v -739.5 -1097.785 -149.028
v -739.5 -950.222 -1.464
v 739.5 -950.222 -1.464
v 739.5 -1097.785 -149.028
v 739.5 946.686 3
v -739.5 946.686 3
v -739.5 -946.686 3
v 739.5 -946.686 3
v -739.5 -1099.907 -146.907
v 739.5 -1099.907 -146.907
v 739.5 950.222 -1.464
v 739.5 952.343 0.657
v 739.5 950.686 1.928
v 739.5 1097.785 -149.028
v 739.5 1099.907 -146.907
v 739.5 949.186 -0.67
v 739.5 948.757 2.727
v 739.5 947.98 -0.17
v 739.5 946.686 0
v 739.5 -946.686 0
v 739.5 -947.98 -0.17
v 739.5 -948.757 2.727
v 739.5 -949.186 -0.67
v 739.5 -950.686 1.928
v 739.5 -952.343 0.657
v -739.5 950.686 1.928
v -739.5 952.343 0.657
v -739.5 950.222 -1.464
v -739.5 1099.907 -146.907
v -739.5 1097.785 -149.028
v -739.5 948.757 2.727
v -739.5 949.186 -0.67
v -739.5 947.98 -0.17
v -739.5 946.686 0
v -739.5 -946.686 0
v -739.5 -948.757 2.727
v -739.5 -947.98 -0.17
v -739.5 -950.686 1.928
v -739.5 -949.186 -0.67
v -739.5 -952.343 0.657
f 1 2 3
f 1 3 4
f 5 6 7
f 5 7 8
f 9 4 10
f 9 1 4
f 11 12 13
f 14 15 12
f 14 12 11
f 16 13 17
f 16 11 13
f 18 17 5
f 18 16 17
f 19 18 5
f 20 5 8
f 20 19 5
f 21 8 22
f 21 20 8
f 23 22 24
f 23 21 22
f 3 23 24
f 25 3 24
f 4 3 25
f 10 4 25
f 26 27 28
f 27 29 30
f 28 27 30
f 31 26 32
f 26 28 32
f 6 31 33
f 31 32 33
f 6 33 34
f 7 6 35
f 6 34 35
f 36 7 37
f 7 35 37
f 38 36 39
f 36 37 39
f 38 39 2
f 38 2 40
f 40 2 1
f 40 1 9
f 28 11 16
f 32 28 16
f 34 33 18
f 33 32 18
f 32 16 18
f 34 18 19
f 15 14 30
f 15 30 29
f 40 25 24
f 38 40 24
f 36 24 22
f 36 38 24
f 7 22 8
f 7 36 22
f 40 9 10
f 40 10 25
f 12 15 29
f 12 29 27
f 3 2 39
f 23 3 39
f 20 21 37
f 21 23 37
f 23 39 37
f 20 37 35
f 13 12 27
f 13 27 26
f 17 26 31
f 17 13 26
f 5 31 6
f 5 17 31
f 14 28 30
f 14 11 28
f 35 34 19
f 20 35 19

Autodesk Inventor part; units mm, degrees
ref_plane "YZ Plane" through (0, 0, 0) normal (1, 0, 0) x (0, 1, 0)
ref_plane "XZ Plane" through (0, 0, 0) normal (0, 1, 0) x (-1, 0, 0)
ref_plane "XY Plane" through (0, 0, 0) normal (0, 0, 1) x (1, 0, 0)
sketch "Sketch1" plane through (0, 0, 0) normal (0, 0, 1) x (1, 0, 0)
  line L0 (-739.5, -950) -> (739.5, -950)
  line L1 (739.5, -950) -> (739.5, 950)
  line L2 (739.5, 950) -> (-739.5, 950)
  line L3 (-739.5, 950) -> (-739.5, -950)
  line L4 (-739.5, -950) -> (739.5, 950) construction
  line L5 (739.5, -950) -> (-739.5, 950) construction
  point P0 (0, 0)
  dimension "d0" = 1479
  dimension "d1" = 1900
extrude "Plate1" add sketch "Sketch1" along normal blind 3
sketch "Sketch2" plane through (739.5, 947.8787, 0.8787) normal (0, 0.7071068, 0.7071068) x (-1, 0, 0)
  line L0 (1479, 0) -> (0, 0)
  line L1 (0, 0) -> (0, -212)
  line L2 (0, -212) -> (1479, -212)
  line L3 (1479, -212) -> (1479, 0)
edge flange "Flange1" height 212 angle 45 thickness 3 bend radius 5 thickness toward (0, 0.7071068, 0.7071068) relief round relief width 3 relief depth 1.5 corner gap 5 corner form 0 edges at (0, 950, 0) (0, -950, 0) wall of the first edge with corners at (-739.5, 947.8787, 0.8787) (739.5, 947.8787, 0.8787) (739.5, 1097.7853, -149.028) (-739.5, 1097.7853, -149.028)
bend "Bend1"
corner "Corner1"
sketch "Sketch4" plane through (739.5, 1097.7853, -149.028) normal (0, -0.7071068, -0.7071068) x (-1, 0, 0)
  line L0 (25, -40) -> (25, -25) construction
  line L1 (25, -25) -> (225, -25) construction
  line L2 (225, -25) -> (225, -40) construction
  line L3 (225, -40) -> (25, -40) construction
  line L4 (1479, 0) -> (0, 0) projected
  line L5 (0, -208.6863) -> (0, 0) projected
  point P0 (739.5, -881.6301)
  dimension "d13" = 200
  dimension "d14" = 15
  dimension "d15" = 25
  dimension "d16" = 25
mark "Mark1"
equation "\"d2\" = Thickness"
equation "\"d3\" = BendReliefWidth"
equation "\"d4\" = BendReliefDepth"
equation "\"d5\" = MinimumRemnant"
equation "\"d6\" = TransitionRadius"
equation "\"d9\" = BendRadius"
equation "\"d10\" = CornerReliefSize"
equation "\"d11\" = GapSize"
equation "\"d12\" = JacobiRadiusSize"
equation "\"BendReliefWidth\" = Thickness"
equation "\"BendReliefDepth\" = 0.5 * Thickness"
equation "\"CornerReliefSize\" = 4 * Thickness"
equation "\"MinimumRemnant\" = 2 * Thickness"
equation "\"TransitionRadius\" = BendRadius"
equation "\"JacobiRadiusSize\" = BendRadius"
equation "\"GapSize\" = Thickness"
equation "\"Thickness\" = 3"
equation "\"BendRadius\" = 5"
properties part number "BSH 011 floor" material "09g2s"
